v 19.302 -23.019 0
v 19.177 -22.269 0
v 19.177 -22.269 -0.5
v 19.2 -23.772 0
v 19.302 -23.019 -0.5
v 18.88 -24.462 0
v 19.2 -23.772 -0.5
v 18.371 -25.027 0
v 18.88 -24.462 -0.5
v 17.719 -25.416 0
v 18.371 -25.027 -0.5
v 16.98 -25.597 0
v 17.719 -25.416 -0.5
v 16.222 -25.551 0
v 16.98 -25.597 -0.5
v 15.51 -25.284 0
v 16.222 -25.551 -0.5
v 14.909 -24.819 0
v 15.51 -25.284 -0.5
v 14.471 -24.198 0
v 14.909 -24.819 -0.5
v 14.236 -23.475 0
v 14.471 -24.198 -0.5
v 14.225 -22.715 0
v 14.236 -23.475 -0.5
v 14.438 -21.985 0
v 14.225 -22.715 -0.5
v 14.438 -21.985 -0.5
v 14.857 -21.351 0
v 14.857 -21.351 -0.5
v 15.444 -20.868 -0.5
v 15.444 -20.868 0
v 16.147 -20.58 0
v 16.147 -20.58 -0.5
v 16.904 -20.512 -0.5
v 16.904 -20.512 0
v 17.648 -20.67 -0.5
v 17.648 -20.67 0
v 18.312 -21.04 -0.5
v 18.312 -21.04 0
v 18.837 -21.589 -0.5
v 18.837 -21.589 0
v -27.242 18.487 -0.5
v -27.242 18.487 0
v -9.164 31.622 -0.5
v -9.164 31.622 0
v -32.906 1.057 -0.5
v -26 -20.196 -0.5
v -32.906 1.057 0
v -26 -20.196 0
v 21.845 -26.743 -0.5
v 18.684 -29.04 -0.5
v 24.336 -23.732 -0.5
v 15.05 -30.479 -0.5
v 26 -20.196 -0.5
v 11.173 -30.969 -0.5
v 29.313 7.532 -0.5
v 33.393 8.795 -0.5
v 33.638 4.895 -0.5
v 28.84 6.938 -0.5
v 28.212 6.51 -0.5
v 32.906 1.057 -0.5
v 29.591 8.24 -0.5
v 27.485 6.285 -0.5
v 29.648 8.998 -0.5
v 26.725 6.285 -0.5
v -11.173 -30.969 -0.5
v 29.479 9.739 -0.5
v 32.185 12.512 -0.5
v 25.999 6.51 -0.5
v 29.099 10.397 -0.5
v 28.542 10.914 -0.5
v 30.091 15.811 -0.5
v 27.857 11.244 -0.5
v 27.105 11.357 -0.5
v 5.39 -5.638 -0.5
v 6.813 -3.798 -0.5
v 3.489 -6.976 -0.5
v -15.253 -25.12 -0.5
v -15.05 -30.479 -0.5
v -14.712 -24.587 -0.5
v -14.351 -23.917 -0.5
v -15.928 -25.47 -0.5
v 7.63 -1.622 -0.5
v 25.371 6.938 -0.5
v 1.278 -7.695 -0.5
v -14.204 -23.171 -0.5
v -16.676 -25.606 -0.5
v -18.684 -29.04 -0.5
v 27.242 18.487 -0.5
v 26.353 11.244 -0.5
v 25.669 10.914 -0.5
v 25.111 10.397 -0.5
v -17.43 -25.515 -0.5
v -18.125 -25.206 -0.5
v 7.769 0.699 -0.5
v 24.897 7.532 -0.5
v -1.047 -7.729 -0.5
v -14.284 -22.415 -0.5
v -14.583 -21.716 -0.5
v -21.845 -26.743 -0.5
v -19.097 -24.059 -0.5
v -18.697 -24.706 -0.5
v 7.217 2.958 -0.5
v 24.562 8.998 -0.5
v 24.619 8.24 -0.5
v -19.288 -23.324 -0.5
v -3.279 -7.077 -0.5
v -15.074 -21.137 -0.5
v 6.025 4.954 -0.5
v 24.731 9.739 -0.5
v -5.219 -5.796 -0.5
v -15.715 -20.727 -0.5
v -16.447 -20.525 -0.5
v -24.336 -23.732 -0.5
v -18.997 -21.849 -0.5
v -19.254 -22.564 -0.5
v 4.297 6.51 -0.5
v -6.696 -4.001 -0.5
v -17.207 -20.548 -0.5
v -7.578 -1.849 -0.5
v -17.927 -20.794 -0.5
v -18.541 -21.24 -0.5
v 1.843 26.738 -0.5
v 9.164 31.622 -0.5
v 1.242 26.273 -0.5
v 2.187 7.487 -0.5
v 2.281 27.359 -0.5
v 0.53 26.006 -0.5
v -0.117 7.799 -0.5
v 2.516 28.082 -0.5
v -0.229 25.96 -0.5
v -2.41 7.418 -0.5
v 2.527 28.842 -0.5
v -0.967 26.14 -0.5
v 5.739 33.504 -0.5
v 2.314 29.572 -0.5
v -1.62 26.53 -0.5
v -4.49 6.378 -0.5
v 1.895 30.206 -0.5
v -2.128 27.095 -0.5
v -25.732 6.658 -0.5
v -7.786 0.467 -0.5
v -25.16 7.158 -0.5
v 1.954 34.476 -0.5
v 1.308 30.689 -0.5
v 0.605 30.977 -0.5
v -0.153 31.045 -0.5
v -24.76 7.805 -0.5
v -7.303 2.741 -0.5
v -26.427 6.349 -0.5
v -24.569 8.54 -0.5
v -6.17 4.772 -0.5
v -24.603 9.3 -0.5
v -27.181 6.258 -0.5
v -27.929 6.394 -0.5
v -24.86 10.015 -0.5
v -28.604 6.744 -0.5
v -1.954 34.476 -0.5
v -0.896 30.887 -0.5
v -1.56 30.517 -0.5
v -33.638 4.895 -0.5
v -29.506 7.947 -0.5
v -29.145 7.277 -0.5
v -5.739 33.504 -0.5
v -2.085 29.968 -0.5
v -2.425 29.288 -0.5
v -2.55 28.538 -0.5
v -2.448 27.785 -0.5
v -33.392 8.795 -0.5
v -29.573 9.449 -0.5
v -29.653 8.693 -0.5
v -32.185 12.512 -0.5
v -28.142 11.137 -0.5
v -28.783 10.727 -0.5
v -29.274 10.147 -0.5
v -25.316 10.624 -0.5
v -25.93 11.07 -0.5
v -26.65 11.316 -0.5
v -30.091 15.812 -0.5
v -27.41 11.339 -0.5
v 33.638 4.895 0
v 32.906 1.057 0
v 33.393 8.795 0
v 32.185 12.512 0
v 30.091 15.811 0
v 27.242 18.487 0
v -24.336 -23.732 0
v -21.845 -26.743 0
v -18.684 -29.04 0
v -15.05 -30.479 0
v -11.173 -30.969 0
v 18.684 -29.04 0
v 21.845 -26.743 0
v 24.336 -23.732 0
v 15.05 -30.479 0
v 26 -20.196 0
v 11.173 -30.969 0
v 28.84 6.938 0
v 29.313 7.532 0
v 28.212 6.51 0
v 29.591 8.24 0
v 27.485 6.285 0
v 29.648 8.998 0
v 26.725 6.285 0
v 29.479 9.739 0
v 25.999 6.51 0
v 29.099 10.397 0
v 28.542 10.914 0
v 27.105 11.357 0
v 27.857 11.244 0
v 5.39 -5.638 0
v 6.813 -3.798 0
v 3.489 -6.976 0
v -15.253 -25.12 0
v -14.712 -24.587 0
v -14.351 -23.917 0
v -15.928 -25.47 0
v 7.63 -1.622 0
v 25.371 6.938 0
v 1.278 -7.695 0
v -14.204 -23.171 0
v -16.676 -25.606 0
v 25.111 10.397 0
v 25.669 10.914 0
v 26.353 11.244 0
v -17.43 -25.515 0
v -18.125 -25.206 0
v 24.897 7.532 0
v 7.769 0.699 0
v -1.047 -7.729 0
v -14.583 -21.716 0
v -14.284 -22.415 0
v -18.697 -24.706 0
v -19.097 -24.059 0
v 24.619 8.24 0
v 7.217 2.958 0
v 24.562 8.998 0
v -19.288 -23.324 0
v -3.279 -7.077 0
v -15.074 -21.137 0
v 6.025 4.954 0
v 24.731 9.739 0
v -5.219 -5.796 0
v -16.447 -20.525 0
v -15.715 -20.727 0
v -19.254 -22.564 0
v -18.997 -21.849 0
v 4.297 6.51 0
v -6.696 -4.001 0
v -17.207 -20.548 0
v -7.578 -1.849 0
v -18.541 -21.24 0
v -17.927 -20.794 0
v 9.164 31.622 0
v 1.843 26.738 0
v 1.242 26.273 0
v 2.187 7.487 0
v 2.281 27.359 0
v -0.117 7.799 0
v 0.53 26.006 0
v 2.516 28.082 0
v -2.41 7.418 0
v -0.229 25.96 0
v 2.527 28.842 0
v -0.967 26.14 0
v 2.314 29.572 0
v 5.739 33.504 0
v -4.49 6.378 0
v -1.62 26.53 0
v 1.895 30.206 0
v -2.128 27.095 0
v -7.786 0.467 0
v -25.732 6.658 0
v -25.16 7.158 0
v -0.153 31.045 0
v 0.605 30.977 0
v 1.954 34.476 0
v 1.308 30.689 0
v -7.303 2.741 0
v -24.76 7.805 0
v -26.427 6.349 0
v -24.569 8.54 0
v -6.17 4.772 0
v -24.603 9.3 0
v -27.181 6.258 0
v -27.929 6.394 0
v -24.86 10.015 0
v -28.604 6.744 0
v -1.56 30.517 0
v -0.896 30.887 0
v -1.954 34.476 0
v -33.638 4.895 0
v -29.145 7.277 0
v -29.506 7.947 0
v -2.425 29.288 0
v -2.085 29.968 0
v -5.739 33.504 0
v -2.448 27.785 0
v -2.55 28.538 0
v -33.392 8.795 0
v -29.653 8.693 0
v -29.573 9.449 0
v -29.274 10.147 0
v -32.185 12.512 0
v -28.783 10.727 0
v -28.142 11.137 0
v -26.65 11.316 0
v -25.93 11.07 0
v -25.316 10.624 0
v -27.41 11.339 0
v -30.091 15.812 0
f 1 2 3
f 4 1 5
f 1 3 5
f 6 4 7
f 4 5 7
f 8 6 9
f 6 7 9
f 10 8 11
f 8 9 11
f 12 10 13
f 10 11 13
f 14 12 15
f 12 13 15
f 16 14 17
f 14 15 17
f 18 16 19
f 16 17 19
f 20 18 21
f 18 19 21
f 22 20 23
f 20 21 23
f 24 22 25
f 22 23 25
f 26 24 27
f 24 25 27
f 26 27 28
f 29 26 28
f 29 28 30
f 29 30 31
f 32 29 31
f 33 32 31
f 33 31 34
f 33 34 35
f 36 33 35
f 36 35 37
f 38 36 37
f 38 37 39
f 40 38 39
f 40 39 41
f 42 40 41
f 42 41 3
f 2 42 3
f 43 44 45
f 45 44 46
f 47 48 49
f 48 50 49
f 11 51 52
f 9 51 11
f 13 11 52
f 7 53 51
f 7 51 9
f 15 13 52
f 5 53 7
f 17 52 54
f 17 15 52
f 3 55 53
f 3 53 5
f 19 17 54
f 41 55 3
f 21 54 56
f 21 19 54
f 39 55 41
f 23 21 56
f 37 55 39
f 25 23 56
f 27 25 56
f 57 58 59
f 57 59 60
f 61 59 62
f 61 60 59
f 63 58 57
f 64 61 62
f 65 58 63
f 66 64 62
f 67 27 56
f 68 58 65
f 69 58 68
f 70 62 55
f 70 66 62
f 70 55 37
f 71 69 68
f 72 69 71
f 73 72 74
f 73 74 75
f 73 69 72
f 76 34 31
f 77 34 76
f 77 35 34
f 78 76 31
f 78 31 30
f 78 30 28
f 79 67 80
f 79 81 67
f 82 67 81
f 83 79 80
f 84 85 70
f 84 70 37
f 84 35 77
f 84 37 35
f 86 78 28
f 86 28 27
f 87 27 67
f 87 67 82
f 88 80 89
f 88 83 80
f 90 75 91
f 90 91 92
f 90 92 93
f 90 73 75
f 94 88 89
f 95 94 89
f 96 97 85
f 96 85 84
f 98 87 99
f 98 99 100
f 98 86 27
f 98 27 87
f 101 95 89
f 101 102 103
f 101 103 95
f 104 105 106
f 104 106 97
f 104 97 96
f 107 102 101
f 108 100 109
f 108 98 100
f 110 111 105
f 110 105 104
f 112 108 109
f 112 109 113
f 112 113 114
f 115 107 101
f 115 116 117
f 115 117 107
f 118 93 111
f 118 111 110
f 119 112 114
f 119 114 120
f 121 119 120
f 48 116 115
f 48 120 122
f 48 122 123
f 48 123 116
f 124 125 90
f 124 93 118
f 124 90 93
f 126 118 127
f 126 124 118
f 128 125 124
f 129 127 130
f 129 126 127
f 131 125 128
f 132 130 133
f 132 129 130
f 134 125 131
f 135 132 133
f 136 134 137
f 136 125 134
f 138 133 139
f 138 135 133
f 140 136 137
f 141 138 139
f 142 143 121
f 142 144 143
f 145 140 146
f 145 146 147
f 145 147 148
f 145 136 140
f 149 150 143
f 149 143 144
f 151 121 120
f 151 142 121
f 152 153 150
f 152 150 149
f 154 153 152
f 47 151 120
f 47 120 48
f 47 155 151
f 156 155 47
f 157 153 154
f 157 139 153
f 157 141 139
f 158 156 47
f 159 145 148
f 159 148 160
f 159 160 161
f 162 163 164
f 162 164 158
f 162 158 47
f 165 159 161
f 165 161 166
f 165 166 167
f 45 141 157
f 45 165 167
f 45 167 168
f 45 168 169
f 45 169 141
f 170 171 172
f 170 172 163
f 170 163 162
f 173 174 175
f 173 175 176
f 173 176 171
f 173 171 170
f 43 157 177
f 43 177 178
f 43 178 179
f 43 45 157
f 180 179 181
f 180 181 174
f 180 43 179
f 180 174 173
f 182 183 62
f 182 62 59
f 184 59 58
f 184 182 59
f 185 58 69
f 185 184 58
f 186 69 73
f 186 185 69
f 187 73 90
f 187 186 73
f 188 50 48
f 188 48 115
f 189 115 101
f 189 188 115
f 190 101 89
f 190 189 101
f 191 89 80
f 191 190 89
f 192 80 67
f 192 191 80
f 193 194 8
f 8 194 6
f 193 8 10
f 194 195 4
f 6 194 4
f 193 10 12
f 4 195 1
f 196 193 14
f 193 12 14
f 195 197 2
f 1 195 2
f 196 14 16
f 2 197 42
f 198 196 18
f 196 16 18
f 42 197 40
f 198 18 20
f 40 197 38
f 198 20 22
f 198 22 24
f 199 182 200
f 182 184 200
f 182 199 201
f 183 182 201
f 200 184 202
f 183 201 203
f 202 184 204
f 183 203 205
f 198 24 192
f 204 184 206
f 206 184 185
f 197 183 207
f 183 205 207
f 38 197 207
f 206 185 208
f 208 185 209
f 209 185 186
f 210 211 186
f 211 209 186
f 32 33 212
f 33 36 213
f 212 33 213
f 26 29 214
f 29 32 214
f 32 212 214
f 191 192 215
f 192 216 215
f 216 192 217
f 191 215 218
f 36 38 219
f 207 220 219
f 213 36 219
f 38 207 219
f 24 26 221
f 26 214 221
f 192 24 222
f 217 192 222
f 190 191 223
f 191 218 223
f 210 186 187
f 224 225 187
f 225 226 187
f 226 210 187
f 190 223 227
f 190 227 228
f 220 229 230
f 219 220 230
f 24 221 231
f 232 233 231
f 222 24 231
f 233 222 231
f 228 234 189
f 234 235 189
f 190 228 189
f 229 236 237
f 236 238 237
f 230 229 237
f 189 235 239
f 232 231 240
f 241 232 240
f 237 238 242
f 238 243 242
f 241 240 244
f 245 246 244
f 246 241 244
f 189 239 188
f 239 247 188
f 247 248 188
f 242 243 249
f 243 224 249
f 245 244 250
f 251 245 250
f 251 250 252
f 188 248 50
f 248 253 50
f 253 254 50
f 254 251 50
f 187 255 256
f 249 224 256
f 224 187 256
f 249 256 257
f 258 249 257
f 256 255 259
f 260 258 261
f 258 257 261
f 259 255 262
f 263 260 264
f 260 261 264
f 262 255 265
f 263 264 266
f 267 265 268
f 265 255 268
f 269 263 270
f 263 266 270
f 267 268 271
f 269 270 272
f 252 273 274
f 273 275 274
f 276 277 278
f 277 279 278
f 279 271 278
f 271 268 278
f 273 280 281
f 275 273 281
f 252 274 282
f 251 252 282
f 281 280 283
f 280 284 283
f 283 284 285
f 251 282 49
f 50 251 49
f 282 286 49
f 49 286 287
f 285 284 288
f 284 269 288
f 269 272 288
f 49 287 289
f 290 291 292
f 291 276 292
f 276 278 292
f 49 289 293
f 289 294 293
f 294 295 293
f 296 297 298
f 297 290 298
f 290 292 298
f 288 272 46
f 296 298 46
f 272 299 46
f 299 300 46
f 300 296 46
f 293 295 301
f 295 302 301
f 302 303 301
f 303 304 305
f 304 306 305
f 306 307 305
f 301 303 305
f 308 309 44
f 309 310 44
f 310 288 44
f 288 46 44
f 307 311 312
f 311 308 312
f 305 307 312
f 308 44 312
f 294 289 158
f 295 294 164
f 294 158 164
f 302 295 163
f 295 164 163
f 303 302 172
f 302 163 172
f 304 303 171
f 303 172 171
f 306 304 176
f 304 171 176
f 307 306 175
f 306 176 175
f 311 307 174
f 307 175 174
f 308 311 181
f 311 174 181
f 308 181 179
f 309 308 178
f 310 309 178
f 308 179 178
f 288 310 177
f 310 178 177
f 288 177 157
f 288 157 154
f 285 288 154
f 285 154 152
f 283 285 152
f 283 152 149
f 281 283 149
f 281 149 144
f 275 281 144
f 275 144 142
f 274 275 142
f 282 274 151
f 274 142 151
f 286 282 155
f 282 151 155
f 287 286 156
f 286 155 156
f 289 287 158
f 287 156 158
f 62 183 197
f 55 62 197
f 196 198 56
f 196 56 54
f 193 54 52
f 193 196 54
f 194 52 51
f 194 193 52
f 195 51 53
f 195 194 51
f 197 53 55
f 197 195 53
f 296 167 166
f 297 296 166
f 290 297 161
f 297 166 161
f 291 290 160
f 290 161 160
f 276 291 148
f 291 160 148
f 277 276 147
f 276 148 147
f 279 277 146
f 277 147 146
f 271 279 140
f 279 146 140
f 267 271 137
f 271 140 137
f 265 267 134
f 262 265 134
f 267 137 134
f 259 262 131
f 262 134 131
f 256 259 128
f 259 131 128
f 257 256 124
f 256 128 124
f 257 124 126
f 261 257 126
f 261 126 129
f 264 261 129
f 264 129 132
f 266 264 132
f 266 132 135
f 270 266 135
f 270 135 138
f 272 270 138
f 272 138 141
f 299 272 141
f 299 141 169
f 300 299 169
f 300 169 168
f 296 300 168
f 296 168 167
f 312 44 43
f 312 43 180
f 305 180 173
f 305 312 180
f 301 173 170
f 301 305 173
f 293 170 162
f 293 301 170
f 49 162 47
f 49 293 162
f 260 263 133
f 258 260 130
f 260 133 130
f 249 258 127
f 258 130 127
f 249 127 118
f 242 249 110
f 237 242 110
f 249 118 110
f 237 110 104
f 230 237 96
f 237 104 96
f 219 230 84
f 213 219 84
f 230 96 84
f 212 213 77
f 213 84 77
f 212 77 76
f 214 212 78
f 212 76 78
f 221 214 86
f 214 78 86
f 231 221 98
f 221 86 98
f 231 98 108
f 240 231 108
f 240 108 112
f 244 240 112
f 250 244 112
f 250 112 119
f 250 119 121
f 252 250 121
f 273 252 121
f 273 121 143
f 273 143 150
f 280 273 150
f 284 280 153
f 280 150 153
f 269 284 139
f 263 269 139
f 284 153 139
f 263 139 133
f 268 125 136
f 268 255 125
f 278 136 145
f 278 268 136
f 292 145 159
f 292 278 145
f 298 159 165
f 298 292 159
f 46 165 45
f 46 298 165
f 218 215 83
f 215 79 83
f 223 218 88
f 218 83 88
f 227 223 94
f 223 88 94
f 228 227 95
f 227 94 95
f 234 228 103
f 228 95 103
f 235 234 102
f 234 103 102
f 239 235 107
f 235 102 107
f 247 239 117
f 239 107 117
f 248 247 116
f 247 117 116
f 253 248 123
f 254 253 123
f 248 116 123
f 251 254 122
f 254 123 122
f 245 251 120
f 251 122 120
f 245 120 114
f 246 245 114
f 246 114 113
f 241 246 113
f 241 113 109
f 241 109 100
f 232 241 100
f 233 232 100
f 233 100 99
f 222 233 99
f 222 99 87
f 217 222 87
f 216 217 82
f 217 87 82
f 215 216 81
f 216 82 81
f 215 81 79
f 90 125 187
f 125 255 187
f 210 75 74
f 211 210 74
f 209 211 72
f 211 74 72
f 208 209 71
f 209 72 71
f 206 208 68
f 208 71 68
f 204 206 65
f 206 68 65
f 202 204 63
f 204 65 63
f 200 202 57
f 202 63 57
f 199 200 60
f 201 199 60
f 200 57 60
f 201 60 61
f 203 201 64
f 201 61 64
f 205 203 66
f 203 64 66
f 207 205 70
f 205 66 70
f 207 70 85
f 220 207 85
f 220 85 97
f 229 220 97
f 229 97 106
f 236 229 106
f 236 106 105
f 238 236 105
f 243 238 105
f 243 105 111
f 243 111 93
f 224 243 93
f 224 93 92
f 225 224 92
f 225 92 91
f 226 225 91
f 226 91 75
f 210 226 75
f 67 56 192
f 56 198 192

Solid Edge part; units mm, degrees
sketch "Sketch1" plane through (0, 0, 0) normal (0, 0, -1) x (-1, 0, 0)
  line L0 (-9.1636, 31.6216) -> (-27.2423, 18.4866)
  arc A0 (-27.2423, 18.4866) -> (-32.9056, 1.0566) centre (-18.0788, 5.8742) ccw
  line L1 (-32.9056, 1.0566) -> (-26.0002, -20.1962)
  arc A1 (-26.0002, -20.1962) -> (-11.1732, -30.9686) centre (-11.1732, -15.3786) ccw
  line L2 (-11.1732, -30.9686) -> (11.1732, -30.9686)
  arc A2 (26.0002, -20.1962) -> (11.1732, -30.9686) centre (11.1732, -15.3786) cw
  line L3 (26.0002, -20.1962) -> (32.9056, 1.0565)
  arc A3 (32.9056, 1.0565) -> (27.2422, 18.4867) centre (18.0786, 5.8741) ccw
  line L4 (27.2422, 18.4867) -> (9.1636, 31.6216)
  arc A4 (9.1636, 31.6216) -> (-9.1636, 31.6216) centre (0, 19.009) ccw
extrude "Protrusion1" add sketch "Sketch1" along normal blind 0.5
hole "Furat_1" at (27.1051, 8.807, -0.5) direction (0, 0, 1) diameter 5.1 end through all
pattern_circular "MintaElőfordulás_1" count 5 over 360 about axis through (0, 0, -0.5) along (0, 0, 1) of "Furat_1"
sketch "Sketch2" plane through (0, 1.8152, -0.5) normal (0, 0, -1) x (-0.309017, 0.9510565, 0)
  circle A0 centre (-1.7263, -0.5609) radius 7.8
extrude "Kivágás_1" cut sketch "Sketch2" against normal blind 32.365
properties material "Szilikon"
